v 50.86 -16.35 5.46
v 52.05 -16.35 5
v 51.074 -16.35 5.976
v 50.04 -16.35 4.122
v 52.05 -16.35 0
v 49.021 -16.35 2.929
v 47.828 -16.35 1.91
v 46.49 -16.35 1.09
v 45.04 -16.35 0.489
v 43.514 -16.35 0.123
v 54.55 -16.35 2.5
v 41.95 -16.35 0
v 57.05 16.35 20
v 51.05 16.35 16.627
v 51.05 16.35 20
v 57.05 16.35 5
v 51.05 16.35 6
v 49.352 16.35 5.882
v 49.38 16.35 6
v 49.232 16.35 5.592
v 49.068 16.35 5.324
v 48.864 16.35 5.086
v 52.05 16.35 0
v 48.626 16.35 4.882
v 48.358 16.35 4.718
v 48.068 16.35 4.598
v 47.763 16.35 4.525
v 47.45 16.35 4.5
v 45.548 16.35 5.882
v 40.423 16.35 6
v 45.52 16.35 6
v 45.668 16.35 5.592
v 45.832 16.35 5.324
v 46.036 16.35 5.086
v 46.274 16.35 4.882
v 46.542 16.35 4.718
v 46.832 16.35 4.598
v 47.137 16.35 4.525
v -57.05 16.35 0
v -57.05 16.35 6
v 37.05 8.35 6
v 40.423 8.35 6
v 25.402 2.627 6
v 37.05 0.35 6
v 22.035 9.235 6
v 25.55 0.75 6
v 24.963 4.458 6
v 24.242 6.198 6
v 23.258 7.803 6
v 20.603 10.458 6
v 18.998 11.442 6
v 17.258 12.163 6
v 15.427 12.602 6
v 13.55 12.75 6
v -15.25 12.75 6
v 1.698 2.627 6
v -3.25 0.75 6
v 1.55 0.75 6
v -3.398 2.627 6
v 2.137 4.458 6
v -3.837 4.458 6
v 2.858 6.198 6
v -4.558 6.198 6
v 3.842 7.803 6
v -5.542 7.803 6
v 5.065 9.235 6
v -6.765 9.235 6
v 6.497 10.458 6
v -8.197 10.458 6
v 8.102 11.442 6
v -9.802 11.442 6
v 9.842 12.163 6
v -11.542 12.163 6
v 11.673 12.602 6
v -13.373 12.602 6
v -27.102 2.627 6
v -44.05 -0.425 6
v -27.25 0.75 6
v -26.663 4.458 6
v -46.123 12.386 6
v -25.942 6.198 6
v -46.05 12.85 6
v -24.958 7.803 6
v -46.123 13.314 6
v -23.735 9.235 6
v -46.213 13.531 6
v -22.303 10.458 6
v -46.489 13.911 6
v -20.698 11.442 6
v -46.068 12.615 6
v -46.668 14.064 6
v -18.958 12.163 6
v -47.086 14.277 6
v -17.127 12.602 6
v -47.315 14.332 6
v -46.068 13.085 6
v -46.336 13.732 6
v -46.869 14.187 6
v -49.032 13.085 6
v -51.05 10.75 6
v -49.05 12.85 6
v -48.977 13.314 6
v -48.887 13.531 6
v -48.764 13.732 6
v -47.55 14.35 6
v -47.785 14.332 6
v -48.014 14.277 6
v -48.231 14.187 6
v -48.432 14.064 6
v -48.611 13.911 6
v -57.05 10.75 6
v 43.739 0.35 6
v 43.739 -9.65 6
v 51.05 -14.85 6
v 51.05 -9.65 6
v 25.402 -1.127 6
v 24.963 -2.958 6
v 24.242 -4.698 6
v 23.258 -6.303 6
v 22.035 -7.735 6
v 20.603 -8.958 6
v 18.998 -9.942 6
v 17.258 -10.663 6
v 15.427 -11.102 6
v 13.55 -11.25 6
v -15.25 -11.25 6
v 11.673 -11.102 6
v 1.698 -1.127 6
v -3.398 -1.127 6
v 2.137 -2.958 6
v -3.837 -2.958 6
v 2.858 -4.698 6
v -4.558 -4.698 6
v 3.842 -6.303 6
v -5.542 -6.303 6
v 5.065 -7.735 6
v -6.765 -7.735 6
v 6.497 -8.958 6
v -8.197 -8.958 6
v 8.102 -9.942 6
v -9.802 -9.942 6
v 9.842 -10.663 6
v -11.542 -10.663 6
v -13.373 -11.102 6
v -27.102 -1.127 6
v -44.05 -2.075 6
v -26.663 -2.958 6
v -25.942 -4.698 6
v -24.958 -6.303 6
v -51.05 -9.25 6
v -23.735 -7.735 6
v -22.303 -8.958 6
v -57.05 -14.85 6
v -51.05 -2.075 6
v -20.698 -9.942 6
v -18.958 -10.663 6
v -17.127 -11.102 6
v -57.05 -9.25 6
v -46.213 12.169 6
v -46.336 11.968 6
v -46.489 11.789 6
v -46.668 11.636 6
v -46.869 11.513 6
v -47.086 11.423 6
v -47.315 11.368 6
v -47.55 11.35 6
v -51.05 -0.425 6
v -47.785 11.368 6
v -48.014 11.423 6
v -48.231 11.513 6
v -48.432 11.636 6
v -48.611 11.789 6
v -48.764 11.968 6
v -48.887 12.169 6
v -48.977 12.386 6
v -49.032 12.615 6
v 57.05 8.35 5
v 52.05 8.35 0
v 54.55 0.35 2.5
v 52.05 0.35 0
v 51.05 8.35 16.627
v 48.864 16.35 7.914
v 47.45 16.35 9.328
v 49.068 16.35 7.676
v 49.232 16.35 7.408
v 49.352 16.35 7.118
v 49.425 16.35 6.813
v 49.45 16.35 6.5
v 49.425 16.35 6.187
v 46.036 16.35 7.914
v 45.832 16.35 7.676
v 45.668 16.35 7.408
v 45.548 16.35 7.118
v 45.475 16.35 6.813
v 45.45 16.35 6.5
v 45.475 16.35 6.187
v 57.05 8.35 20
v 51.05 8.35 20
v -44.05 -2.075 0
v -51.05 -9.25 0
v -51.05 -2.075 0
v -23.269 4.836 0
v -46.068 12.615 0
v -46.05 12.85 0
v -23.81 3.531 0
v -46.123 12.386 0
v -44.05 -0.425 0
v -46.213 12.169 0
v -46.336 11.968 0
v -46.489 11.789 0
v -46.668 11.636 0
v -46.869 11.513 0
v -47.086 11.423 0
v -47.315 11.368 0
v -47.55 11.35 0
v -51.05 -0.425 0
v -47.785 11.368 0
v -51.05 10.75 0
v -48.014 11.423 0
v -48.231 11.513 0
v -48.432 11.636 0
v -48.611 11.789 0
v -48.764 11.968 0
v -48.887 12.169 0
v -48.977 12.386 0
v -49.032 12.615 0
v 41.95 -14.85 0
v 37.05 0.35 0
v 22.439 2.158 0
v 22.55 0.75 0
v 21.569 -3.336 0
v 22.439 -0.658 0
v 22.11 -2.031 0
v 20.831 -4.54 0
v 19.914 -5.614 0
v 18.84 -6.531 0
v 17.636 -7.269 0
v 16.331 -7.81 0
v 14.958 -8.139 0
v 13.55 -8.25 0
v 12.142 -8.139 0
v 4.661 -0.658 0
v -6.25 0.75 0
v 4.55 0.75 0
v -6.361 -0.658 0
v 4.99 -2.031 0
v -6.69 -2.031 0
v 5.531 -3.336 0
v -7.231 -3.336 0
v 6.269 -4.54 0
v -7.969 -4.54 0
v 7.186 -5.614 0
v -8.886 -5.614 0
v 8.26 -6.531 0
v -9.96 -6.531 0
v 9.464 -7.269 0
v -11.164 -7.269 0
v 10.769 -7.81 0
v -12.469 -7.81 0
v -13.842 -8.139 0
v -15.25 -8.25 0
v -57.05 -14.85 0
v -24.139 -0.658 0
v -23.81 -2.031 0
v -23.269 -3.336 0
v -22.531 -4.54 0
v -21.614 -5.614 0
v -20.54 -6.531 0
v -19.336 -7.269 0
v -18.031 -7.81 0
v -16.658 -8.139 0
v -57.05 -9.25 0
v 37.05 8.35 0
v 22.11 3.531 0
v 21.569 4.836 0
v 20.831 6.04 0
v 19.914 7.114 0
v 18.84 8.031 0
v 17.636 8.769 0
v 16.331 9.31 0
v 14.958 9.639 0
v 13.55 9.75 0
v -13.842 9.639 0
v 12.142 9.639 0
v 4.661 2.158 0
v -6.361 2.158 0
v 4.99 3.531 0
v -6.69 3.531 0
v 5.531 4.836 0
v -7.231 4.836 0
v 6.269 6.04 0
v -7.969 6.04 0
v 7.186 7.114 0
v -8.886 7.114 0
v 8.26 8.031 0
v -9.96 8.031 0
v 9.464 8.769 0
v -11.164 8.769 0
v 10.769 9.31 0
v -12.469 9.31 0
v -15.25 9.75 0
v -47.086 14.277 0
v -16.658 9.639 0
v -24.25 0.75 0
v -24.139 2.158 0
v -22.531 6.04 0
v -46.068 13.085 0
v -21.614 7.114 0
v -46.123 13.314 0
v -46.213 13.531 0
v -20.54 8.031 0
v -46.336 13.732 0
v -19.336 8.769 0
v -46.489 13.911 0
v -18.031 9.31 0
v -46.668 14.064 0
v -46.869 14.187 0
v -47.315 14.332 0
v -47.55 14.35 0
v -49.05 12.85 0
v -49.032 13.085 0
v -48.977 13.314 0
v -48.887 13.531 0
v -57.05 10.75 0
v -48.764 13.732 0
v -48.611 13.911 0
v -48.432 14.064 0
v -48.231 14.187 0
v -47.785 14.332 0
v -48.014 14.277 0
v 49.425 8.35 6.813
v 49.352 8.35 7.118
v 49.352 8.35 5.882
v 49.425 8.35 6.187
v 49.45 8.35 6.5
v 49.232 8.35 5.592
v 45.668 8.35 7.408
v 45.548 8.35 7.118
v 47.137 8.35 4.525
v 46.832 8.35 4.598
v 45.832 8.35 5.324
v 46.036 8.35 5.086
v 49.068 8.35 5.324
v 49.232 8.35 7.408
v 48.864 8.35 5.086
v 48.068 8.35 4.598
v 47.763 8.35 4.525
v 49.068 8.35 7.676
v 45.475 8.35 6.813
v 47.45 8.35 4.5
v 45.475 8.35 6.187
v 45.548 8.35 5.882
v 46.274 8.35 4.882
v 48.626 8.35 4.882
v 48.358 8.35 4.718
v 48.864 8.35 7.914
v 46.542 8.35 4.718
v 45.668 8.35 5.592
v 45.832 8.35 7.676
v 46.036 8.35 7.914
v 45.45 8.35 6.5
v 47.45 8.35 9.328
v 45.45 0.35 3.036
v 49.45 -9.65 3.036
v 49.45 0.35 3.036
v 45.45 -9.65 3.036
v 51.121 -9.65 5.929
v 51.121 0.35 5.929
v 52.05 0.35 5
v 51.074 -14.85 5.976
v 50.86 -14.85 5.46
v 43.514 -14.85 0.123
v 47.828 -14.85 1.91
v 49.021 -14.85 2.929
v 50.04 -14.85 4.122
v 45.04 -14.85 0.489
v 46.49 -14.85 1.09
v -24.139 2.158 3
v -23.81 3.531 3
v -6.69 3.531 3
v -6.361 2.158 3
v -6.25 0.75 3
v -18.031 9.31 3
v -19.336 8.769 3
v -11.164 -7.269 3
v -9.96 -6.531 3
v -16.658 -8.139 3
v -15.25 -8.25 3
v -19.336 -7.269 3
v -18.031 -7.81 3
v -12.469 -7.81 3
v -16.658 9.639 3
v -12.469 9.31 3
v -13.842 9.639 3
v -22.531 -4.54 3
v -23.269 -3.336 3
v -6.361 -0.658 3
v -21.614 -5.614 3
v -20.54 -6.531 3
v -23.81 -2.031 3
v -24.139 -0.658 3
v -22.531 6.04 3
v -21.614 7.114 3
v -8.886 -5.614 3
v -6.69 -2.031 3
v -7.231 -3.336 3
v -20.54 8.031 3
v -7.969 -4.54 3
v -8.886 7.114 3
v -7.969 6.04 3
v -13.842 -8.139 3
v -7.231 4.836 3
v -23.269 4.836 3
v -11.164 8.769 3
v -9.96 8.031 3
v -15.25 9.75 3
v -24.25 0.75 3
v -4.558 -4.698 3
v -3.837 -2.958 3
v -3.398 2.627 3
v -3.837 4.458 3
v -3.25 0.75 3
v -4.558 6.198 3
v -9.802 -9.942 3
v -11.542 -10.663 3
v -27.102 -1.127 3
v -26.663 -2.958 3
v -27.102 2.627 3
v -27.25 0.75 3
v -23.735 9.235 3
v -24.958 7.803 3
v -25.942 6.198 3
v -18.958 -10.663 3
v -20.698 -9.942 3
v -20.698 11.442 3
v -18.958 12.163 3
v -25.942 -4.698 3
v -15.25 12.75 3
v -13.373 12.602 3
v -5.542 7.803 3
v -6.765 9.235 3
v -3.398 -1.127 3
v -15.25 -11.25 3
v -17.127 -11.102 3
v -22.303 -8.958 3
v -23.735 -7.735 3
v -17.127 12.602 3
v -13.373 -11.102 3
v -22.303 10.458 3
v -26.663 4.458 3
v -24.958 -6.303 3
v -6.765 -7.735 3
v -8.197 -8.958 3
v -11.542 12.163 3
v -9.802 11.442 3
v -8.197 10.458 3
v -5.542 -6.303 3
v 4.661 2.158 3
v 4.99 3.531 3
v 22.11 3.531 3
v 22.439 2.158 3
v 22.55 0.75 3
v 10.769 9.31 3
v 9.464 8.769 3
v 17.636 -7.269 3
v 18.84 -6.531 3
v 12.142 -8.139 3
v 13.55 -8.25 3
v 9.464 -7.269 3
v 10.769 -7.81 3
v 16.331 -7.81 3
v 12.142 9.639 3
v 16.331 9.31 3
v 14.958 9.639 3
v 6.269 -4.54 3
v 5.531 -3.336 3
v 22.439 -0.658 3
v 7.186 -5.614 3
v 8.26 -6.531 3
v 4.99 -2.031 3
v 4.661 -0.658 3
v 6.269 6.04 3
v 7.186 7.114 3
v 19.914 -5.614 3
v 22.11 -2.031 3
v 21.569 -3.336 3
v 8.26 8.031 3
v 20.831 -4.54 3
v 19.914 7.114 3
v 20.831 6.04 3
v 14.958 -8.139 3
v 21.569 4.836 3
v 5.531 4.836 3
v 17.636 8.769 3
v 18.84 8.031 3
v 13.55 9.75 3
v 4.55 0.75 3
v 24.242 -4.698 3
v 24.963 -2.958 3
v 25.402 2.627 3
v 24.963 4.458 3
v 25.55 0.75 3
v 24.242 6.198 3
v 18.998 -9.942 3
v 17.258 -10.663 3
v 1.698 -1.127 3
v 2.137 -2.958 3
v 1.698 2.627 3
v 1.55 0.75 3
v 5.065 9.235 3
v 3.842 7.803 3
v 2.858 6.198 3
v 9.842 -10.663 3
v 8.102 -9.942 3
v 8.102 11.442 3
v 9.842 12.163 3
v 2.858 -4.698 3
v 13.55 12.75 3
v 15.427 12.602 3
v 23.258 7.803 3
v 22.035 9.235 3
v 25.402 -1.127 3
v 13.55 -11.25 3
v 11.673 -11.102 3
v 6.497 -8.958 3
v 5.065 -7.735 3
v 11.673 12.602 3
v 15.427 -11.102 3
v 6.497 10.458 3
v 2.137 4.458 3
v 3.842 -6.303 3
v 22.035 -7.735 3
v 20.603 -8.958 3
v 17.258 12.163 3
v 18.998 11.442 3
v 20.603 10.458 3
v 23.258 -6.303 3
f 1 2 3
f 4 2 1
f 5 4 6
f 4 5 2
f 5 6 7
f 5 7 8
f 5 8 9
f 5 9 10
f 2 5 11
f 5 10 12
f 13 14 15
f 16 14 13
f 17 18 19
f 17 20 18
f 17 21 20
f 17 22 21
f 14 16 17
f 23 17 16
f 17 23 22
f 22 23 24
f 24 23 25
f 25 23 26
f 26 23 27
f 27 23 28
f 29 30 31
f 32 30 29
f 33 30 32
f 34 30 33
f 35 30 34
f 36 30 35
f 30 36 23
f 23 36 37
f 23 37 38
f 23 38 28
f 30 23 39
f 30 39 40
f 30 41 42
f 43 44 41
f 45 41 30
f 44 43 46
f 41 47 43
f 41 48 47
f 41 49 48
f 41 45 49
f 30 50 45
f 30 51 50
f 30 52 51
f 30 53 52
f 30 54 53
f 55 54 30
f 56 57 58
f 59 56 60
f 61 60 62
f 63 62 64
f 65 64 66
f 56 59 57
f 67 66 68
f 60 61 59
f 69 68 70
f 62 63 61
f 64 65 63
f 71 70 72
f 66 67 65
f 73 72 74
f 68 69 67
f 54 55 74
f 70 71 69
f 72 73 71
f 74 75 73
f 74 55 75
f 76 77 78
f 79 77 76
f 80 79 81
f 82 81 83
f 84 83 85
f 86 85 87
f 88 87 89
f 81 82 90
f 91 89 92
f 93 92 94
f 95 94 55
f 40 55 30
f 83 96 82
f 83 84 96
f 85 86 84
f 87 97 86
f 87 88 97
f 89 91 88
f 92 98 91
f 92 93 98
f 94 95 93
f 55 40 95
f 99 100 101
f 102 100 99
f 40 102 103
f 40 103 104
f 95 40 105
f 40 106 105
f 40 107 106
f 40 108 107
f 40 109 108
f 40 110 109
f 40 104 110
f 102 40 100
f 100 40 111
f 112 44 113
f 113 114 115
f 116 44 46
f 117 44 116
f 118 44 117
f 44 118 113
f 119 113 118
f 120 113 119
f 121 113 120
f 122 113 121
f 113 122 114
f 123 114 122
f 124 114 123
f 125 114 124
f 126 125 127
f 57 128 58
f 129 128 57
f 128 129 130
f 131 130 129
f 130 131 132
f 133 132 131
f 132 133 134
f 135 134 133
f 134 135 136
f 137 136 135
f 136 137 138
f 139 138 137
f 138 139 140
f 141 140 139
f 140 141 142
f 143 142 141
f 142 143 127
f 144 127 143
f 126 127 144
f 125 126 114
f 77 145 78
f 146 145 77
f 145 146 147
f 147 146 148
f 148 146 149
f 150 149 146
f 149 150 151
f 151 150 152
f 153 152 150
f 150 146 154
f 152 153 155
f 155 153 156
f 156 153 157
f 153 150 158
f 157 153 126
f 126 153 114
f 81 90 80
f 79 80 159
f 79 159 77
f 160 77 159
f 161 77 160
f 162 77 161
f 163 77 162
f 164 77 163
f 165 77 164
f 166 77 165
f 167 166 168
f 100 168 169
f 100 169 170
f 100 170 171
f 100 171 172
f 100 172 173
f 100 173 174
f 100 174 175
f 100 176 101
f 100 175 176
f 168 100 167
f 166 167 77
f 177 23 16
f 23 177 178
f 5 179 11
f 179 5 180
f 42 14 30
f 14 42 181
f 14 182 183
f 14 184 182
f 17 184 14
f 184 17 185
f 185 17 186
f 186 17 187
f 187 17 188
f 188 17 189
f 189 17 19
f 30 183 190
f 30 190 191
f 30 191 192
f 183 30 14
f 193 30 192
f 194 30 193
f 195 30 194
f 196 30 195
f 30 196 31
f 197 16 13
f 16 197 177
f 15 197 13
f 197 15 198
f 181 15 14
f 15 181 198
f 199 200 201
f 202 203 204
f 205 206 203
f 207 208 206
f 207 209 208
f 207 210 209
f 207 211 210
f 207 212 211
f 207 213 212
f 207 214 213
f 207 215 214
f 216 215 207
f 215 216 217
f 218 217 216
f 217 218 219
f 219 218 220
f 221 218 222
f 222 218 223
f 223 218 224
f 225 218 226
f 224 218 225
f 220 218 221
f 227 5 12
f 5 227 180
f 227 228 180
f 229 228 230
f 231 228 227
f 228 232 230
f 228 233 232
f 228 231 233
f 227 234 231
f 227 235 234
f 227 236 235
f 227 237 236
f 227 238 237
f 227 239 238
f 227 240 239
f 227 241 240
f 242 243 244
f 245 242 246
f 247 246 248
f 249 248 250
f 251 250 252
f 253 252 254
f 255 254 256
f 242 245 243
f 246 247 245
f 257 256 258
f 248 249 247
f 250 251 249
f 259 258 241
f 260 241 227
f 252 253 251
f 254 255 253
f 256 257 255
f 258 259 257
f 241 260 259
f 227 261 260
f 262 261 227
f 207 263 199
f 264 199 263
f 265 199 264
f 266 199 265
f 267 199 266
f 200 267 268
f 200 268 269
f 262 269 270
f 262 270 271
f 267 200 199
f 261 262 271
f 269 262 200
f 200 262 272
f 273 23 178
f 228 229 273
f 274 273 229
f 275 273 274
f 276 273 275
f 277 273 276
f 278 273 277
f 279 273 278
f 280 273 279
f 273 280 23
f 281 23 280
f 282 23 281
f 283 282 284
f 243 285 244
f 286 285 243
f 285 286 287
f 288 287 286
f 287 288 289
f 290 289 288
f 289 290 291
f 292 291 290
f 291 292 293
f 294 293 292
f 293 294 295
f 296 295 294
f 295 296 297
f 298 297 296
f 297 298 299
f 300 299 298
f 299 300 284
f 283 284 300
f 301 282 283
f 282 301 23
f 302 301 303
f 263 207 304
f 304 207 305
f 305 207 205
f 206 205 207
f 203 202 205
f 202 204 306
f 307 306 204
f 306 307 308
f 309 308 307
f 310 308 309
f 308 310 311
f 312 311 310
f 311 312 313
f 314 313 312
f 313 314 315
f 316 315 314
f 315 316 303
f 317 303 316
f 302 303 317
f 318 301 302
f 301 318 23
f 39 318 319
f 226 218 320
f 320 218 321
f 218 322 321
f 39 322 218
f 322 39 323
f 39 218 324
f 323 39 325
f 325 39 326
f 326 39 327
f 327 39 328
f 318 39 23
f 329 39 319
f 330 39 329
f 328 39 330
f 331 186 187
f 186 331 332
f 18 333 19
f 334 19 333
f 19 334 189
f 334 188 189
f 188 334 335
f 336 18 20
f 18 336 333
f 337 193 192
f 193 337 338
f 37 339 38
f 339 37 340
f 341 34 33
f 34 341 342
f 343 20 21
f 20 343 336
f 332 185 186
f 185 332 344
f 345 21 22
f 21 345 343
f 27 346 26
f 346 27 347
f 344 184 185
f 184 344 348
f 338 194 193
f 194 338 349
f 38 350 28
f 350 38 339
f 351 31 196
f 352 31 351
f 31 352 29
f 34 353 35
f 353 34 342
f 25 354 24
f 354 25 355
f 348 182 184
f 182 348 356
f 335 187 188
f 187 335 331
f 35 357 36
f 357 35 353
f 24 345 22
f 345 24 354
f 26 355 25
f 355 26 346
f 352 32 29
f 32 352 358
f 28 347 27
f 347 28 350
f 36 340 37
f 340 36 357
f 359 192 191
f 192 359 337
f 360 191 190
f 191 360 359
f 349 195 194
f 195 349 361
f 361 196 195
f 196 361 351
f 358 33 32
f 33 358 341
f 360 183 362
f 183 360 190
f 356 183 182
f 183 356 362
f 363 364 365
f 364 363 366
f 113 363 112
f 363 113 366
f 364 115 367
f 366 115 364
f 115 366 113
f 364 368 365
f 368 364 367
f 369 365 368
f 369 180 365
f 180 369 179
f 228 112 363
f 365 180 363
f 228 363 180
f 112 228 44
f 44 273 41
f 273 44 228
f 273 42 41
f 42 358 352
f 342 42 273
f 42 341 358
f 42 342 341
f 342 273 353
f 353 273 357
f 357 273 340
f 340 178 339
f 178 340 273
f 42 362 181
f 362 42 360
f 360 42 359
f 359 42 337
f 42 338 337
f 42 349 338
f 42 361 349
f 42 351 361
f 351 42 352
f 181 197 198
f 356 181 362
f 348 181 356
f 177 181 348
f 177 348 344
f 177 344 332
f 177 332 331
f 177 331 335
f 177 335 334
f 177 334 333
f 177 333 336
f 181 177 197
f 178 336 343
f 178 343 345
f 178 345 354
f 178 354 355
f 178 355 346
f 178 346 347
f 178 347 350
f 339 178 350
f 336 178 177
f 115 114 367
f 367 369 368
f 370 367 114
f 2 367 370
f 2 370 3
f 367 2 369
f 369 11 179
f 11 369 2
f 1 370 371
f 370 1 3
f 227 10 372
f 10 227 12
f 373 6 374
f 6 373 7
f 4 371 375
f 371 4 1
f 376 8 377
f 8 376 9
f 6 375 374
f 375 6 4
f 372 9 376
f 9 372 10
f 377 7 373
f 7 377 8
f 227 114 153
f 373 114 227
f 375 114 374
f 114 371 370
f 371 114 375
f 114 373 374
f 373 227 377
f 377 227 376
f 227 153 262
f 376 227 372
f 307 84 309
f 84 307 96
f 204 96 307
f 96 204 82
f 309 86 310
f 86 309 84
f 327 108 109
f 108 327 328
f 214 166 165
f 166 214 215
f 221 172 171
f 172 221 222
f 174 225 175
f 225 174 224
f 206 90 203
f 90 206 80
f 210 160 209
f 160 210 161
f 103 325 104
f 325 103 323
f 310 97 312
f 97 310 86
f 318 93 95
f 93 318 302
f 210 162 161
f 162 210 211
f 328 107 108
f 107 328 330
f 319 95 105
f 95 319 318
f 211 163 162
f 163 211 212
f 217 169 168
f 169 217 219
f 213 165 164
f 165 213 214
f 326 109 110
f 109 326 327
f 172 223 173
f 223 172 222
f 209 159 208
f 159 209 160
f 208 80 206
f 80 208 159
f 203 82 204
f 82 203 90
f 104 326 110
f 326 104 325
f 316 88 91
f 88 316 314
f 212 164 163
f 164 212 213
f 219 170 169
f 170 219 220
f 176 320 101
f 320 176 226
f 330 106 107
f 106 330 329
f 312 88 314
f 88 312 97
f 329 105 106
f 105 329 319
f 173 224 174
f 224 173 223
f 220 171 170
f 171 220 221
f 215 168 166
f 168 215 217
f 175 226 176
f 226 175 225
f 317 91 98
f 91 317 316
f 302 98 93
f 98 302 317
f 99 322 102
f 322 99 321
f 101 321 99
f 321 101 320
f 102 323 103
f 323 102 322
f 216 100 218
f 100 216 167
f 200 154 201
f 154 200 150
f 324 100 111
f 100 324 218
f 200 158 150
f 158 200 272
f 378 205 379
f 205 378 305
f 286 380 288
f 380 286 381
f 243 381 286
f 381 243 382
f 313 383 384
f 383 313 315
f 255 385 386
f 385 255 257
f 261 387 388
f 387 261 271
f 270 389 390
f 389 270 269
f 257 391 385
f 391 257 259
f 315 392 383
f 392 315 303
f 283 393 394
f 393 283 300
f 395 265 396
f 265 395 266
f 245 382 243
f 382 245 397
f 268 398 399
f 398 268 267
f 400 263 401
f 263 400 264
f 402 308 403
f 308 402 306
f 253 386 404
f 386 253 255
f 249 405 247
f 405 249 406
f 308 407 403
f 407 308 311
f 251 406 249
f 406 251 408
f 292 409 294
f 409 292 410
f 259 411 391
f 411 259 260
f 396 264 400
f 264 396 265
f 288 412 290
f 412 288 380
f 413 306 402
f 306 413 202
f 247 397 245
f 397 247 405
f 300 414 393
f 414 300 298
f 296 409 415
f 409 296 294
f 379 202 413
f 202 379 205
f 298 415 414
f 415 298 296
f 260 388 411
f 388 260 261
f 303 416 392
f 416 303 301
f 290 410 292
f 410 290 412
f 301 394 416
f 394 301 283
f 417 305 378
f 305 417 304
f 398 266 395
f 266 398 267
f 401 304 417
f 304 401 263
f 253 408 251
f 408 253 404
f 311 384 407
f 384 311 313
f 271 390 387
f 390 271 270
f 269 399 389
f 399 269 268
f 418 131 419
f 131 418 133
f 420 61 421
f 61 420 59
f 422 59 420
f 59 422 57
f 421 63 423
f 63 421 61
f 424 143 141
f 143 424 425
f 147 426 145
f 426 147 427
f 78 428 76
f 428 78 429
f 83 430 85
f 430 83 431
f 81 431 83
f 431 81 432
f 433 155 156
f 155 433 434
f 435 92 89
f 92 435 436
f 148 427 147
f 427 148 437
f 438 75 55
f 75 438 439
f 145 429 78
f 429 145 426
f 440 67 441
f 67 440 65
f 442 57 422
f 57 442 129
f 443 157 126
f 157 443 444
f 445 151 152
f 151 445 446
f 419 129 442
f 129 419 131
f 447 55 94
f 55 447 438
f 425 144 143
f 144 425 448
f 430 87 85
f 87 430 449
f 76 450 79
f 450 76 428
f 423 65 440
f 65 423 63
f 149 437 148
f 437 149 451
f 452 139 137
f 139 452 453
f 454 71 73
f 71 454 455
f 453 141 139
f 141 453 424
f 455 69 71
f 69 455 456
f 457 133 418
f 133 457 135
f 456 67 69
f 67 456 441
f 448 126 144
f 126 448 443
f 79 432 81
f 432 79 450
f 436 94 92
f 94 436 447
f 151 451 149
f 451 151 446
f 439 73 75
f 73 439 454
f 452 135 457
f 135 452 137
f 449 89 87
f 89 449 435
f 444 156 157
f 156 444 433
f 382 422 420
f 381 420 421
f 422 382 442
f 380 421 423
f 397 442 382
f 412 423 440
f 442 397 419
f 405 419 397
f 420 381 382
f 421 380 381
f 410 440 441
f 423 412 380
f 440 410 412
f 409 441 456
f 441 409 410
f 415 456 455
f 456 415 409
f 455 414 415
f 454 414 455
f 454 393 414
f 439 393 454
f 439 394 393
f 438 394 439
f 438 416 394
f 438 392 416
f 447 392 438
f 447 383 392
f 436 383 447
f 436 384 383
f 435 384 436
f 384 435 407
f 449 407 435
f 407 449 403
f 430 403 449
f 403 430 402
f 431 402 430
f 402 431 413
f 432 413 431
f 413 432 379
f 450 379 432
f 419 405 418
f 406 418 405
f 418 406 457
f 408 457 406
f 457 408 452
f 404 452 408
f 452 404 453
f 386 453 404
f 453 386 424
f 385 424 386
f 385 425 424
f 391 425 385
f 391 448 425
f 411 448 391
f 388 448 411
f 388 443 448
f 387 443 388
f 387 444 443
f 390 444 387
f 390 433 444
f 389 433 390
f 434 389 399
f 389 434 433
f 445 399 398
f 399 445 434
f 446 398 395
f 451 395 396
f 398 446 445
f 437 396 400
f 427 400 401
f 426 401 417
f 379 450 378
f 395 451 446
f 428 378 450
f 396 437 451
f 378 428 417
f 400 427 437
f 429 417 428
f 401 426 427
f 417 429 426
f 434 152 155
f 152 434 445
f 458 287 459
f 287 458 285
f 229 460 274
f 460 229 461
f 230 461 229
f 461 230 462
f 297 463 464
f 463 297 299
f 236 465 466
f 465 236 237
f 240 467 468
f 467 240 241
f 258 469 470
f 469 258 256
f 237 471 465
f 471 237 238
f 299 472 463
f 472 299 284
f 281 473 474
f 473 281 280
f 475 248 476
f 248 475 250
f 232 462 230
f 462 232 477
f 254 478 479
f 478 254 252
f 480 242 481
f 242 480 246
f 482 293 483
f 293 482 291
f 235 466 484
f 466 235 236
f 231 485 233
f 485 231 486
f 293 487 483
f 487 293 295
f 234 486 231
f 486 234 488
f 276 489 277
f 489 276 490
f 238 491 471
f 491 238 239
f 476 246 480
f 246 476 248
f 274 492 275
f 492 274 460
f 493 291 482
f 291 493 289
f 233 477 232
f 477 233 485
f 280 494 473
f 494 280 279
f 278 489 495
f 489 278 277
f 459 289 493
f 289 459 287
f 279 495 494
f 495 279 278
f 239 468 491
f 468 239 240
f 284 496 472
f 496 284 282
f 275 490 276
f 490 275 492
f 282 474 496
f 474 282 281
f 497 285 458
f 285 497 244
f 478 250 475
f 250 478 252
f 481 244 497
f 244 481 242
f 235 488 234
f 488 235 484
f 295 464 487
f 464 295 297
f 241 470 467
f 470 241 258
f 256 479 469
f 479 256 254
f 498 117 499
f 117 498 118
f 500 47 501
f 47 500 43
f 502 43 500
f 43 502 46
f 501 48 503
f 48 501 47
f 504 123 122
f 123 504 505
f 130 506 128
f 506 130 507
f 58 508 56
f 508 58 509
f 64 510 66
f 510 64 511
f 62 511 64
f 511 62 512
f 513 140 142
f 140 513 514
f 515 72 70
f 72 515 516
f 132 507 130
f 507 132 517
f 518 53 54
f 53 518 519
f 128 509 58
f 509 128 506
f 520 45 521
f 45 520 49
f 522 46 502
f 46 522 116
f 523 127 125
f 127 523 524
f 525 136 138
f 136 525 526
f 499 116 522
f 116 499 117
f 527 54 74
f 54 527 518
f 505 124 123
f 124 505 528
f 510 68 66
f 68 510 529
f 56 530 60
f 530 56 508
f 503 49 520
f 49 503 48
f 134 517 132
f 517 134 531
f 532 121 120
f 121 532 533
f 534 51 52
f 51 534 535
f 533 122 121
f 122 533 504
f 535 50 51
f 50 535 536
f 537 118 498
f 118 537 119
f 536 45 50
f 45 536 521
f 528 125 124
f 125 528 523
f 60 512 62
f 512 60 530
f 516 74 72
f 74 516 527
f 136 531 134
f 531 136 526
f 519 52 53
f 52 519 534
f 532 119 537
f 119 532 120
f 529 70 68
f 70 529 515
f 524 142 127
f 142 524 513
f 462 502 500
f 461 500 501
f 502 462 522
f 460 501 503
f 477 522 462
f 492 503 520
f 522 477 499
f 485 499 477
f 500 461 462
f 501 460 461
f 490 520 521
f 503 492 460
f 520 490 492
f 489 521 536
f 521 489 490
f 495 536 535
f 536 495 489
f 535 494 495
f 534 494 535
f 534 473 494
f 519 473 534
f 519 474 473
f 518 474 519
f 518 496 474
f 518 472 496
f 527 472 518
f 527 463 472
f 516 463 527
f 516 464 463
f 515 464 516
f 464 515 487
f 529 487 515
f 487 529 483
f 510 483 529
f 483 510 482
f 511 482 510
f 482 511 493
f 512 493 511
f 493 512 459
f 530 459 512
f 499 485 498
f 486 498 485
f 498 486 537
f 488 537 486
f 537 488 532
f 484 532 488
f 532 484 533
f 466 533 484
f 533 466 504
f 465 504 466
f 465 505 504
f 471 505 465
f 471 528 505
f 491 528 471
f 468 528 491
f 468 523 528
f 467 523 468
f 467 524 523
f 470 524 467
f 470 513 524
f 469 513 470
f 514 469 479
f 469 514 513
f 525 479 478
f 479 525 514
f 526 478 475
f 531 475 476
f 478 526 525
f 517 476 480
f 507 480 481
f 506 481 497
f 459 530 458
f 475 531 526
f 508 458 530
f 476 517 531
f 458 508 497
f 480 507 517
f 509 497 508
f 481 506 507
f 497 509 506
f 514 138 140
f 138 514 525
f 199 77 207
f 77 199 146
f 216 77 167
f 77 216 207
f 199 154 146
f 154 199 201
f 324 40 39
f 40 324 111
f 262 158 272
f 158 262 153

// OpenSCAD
// file: _ittybox.scad
include <_constants.scad>

module panel(wall_thickness, side=false) {
	bolt_x = side ? bolt_offset_y : bolt_offset_x;
	bolt_z = side ? bolt_offset_x : bolt_offset_y;
	width = side ? panel_depth : panel_width;
	overlap_cutout_potition = side ? end_corner_height : -end_corner_height;
	overlap_cutout_size = side ? end_corner_height*2 : end_corner_height;

	difference() {
		union() {
			// Main panel
			translate([0, 0, wall_thickness/2]) {
				cube([width - corner_radius*2, height, wall_thickness], center=true);
			}

			for (x = [-1, 1]) {
				// Rounded corner
				translate([x*(width/2 - corner_radius), 0, corner_radius]) {
					r = corner_radius;
					rotate([90, 0, 0]) {
						intersection() {
							cylinder(height, r=r, center=true, $fn=4);
							mirror([x > 0 ? 1 : 0, 0, 0]) translate([0, 0, -height/2]) {
								linear_extrude(height=height) polygon([[-r, r], [-r, -r], [r, -r]]);
							}
						}
					}
				}
				overlap_length = corner_overlap - corner_radius;

				// Overlap side
				translate([x*(width/2 - wall_thickness/2), 0, corner_radius + overlap_length/2]) {
					cube([wall_thickness, height, overlap_length], center=true);
				}

				// Corner chamfer
				translate([x*(width/2), height/2 - end_corner_height*2, 0]) {
					mirror([x > 0 ? 1 : 0, 0, 0])
					intersection() {
						rotate([0, 45, 0]) cube([corner_chamfer*2, height*2, corner_chamfer*2], center=true);
						translate([wall_thickness, 0, wall_thickness]) {
							cube([width/2, end_corner_height*2, corner_overlap - wall_thickness], center=false);
						}
					}
				}
			}

			if (side) {
				// Plexi support
				support_height = (panel_width - plexi_width)/2 + 4;
				support_depth = plexi_thickness + 5;
				translate([0, -height/2 + plexi_thickness/2, support_height/2]) {
					cube([width - corner_radius*2, support_depth, support_height], center=true);
				}
			}
		}

		for (x = [-1, 1]) {
			// Bolt hole
			translate([x*(width/2 - bolt_x), height/2 - end_corner_height*2, bolt_z]) {
				rotate([-90, 0, 0]) cylinder(height, d=bolt_diameter, center=false);
				rotate([0, -45, 0]) cube([bolt_diameter/2, height, bolt_diameter/2], center=false);
				bolt_depression = bolt_nut_thickness/2;
				rotate([90, 0, 0]) cylinder(bolt_nut_clearance, d=bolt_nut_width, center=false, $fn=6);
				mirror([0, 1, 0]) translate([-bolt_nut_width/2, 0, 0]) cube([bolt_nut_width, bolt_nut_clearance, bolt_nut_width], center=false);
			}

			// Overlap cutout
			translate([x*(width/2), height/2 + overlap_cutout_potition - overlap_cutout_size/2, 0]) {
				cube([corner_overlap*2, overlap_cutout_size, corner_overlap*4], center=true);
			}

			// Diagonal corner cut
			translate([x*(width/2), height/2 - end_corner_height*2, 0]) {
				mirror([0, 1, 0]) rotate([0, -45, 0]) cube([width, height, width], center=false);
			}
		}
	}
}

module plexi_hole() {
	hull() {
		translate([
			-plexi_width/2 + plexi_hole_offset_x + plexi_hole_diameter/2,
			-plexi_depth/2 + plexi_hole_offset_y + plexi_hole_diameter/2,
			0,
		]) {
			cylinder(plexi_thickness*2, d=plexi_hole_diameter, center=true);
			translate([0, plexi_hole_length - plexi_hole_diameter, 0]) cylinder(plexi_thickness*2, d=plexi_hole_diameter, center=true);
		}
	}
}

module plexi() {
	difference() {
		translate([0, 0, plexi_thickness/2]) {
			minkowski() {
				cube([
					plexi_width - plexi_corner_radius*2,
					plexi_depth - plexi_corner_radius*2,
					plexi_thickness/2,
				], center=true);
				cylinder(plexi_thickness/2, r=plexi_corner_radius, center=true);
			}
		}
		// plexi_hole();
		// mirror([0, 1, 0]) plexi_hole();
		// mirror([1, 0, 0]) plexi_hole();
		// rotate([0, 0, 180]) plexi_hole();
	}
}

module end_panel(wall_thickness) {
	difference() {
		panel(wall_thickness, side=false);
		translate([0, -height/2, panel_depth/2]) rotate([-90, 0, 0]) plexi();
	}
}

module side_panel(wall_thickness) {
	difference() {
		panel(wall_thickness, side=true);
		translate([0, -height/2, panel_width/2]) rotate([-90, 90, 0]) plexi();
	}
}

module button_hole() {
	cylinder(button_panel_thickness*3, d=button_diameter, center=true);
	translate([0, 0, button_panel_thickness])
		cylinder(button_panel_thickness*2, d=button_tab_diameter, center=false);
}

module back_panel() {
	wall_thickness = 6;
	difference() {
		end_panel(wall_thickness);

		// USB port panel
		translate([0, height/2 - usb_panel_board_pos_y, 0]) {
			cube([usb_panel_width, usb_panel_board_thickness, wall_thickness*3], center=true);
		}
		translate([0, height/2 - usb_panel_height/2, 0]) {
			cube([usb_panel_inner_width, usb_panel_inner_height, wall_thickness*3], center=true);
			screw_x = usb_panel_width/2 - usb_panel_hole_offset;
			screw_y = usb_panel_height/2 - usb_panel_hole_offset;
			for (xy = [ [screw_x, screw_y], [-screw_x, -screw_y] ]) {
				translate([each xy, 0]) {
					cylinder(wall_thickness*3, d=usb_panel_hole_diameter, center=true);
				}
			}
		}

		// Button holes
		translate([0, height/2 - usb_panel_height/2, 0]) {
			offset = usb_panel_width/2;
			for (x = [
				-(offset + button_spacing*2),
				-(offset + button_spacing),
				(offset + button_spacing),
				(offset + button_spacing*2),
			]) {
				translate([x, 0, 0]) {
					button_hole();
				}
			}
		}
	}
}

module front_panel() {
	end_panel(4);
}

module left_panel() {
	side_panel(4);
}

module right_panel() {
	wall_thickness = 4;
	switch_offset_x = panel_depth - 43;
	switch_offset_y = 8;
	difference() {
		side_panel(wall_thickness);
		translate([-panel_depth/2 + switch_offset_x, height/2 - switch_offset_y, 0]) {
			cube([12, 10, wall_thickness*3], center=true);
		}
	}
}

module panel_joint() {
	joint_inner = 6;
	joint_outer = 9;
	joint_length = 6;
	spacing = (joint_inner + joint_outer)/2;
	translate([-joint_length/2, 0, -corner_overlap])
	linear_extrude(height=corner_overlap*3)
	polygon([
		[0, height],
		[-panel_width, height],
		[-panel_width, -height],
		[0, -height],
		[0, -spacing - joint_inner/2],
		[joint_length, -spacing - joint_outer/2],
		[joint_length, -spacing + joint_outer/2],
		[0, -spacing + joint_inner/2],
		[0, spacing - joint_inner/2],
		[joint_length, spacing - joint_outer/2],
		[joint_length, spacing + joint_outer/2],
		[0, spacing + joint_inner/2],
	]);
}

module panel_split() {
  translate([0, -height, -corner_overlap*2])
  mirror([1, 0, 0])
  cube([panel_width, height*2, corner_overlap*4]);
}

back_panel();
translate([0, height*1.5, 0]) front_panel();
translate([0, height*-1.5, 0]) right_panel();
translate([0, height*-3, 0]) left_panel();
// file: _constants.scad
$fn = 40;

// AllFightSticks 9.5" Button Panel - Stickless
// https://allfightsticks.com/collections/9-5-enclosures/products/9-5-button-panel?variant=21327143141455
panel_width = 228.2;
panel_depth = 171.5;
bolt_offset_x = 9.6; // distance to center of hole
bolt_offset_y = 6.5; // distance to center of hole
corner_radius = 5;

// FocusAttack Blank Plexi Cover for AllFightSticks 9.5" Solid Bottom Panel
// https://focusattack.com/blank-plexi-cover-for-allfightsticks-9-5-solid-bottom-panel/
plexi_width = 218;
plexi_depth = panel_depth;
plexi_thickness = 1.5;
plexi_hole_offset_x = 11.1; // distance to edge
plexi_hole_offset_y = 8.85; // distance to edge
plexi_hole_diameter = 8;
plexi_hole_length = 14;
plexi_corner_radius = 10;

// Sanwa SDM-18 buttons
// https://paradisearcadeshop.com/home/controls/buttons/sanwa/358-sanwa-sdm-series
button_diameter = 18;
button_tab_diameter = 24;
button_panel_thickness = 3;

// Brook Wireless Fighting Board
// https://www.brookaccessory.com/detail/41130595/
usb_panel_width = 26;
usb_panel_height = 31.2;
usb_panel_depth = 1.6;
usb_panel_hole_offset = 3.5; // from top/side edge
usb_panel_hole_diameter = 3; // M3
usb_panel_board_thickness = 1.65; // horizontal board
usb_panel_board_pos_y = 17.6; // from top
usb_panel_inner_width = 12; // USB connector housing
usb_panel_inner_height = 20; // USB connector housing/3.5mm jack

// M4 x 20mm internal hex button-head screw
bolt_diameter = 4;
bolt_length = 20;
bolt_nut_thickness = 3.2;
bolt_nut_width = 8; // outer
bolt_nut_clearance = 10;

height = usb_panel_height + plexi_thickness;
corner_overlap = 20;
end_corner_height = 8;
corner_chamfer = 16;
button_spacing = button_tab_diameter*1.2;
joint_offset = 0.5; // Accounts for extra length added by joint
// main file
include <_constants.scad>
use <_ittybox.scad>;

translate([-panel_width/4, 0, 0])
difference() {
  back_panel();
  panel_split();
}
